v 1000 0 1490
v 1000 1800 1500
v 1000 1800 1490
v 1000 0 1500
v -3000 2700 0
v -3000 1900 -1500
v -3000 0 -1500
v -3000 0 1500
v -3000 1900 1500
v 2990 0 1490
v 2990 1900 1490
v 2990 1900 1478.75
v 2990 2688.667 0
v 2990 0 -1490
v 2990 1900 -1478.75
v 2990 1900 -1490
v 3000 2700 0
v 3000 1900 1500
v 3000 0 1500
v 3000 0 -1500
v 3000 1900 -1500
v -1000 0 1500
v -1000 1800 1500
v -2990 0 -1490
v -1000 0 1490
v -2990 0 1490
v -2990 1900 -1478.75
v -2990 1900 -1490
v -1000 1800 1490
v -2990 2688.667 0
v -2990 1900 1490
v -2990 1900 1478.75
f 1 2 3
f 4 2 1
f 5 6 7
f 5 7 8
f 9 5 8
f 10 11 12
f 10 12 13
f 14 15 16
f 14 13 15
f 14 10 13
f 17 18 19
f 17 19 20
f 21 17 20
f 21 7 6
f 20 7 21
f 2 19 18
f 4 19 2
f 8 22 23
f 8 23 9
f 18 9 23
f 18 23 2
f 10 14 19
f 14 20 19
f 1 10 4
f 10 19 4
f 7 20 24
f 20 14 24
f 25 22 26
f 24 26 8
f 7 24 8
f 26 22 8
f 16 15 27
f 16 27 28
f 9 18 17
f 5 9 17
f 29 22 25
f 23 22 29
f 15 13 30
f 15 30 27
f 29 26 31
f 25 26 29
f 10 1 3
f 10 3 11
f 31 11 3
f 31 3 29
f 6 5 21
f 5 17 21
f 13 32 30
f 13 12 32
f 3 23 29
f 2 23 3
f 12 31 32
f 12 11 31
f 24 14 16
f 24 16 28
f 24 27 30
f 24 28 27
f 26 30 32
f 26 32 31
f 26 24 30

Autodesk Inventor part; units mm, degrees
ref_plane "YZ Plane" through (0, 0, 0) normal (1, 0, 0) x (0, 1, 0)
ref_plane "XZ Plane" through (0, 0, 0) normal (0, 1, 0) x (-1, 0, 0)
ref_plane "XY Plane" through (0, 0, 0) normal (0, 0, 1) x (1, 0, 0)
sketch "Sketch1" plane through (0, 0, 0) normal (0, 1, 0) x (-1, 0, 0)
  line L0 (3000, -1500) -> (-3000, -1500)
  line L1 (-3000, -1500) -> (-3000, 1500)
  line L2 (-3000, 1500) -> (3000, 1500)
  line L3 (3000, 1500) -> (3000, -1500)
  line L4 (2990, 1490) -> (-2990, 1490)
  line L5 (-2990, 1490) -> (-2990, -1490)
  line L6 (-2990, -1490) -> (2990, -1490)
  line L7 (2990, -1490) -> (2990, 1490)
  point P0 (0, 0)
  point P1 (-3000, 0)
  point P2 (0, -1500)
  dimension "d0" = 3000
  dimension "d1" = 6000
  dimension "d2" = 10
extrude "Extrusion1" add sketch "Sketch1" along normal blind 1900
sketch "Sketch2" plane through (3000, 0, 1500) normal (1, 0, 0) x (0, 0, -1)
  line L0 (0, 1900) -> (3000, 1900) projected
  line L1 (0, 0) -> (0, 1900) projected
  line L2 (0, 1900) -> (1500, 2700)
  line L3 (3000, 0) -> (3000, 1900) projected
  line L4 (1500, 2700) -> (3000, 1900)
  line L5 (4.7059, 1891.1765) -> (1500, 2688.6667)
  line L6 (1500, 2688.6667) -> (2995.2941, 1891.1765)
  point P0 (1500, 0)
  point P1 (2990, 1900)
  point P2 (1500, 1900)
  point P3 (21.25, 1900)
  point P4 (2978.75, 1900)
  dimension "d5" = 1700
  dimension "d6" = 10
extrude "Extrusion2" add sketch "Sketch2" against normal up to surface (6000 mm away) contours L2 L4 L0 L6 L5
sketch "Sketch3" plane through (-3000, 0, -1500) normal (-1, 0, 0) x (0, 0, 1)
  line L0 (21.25, 1900) -> (2978.75, 1900) projected
  line L1 (1500, 2688.6667) -> (21.25, 1900) projected
  line L2 (2978.75, 1900) -> (1500, 2688.6667) projected
  point P0 (1500, 0)
extrude "Extrusion3" add sketch "Sketch3" against normal blind 10
sketch "Sketch4" plane through (3000, 0, 1500) normal (1, 0, 0) x (0, 0, -1)
  line L0 (21.25, 1900) -> (1500, 2688.6667) projected
  line L1 (21.25, 1900) -> (2978.75, 1900) projected
  line L2 (1500, 2688.6667) -> (2978.75, 1900) projected
  point P0 (1500, 0)
extrude "Extrusion4" add sketch "Sketch4" against normal blind 10
sketch "Sketch5" plane through (-3000, 0, 1500) normal (0, 0, 1) x (1, 0, 0)
  line L0 (2000, 1800) -> (4000, 1800)
  line L1 (4000, 1800) -> (4000, 0)
  line L2 (4000, 0) -> (2000, 0)
  line L3 (2000, 0) -> (2000, 1800)
  line L4 (0, 0) -> (6000, 0) projected
  line L5 (0, 1900) -> (6000, 1900) projected
  point P0 (3000, 0)
  point P1 (3000, 0)
  point P2 (3000, 0)
  dimension "d13" = 100
  dimension "d14" = 2000
extrude "Extrusion5" cut sketch "Sketch5" against normal up to surface (10 mm away)
properties part number "BungaCamp-CostcoCarport"
